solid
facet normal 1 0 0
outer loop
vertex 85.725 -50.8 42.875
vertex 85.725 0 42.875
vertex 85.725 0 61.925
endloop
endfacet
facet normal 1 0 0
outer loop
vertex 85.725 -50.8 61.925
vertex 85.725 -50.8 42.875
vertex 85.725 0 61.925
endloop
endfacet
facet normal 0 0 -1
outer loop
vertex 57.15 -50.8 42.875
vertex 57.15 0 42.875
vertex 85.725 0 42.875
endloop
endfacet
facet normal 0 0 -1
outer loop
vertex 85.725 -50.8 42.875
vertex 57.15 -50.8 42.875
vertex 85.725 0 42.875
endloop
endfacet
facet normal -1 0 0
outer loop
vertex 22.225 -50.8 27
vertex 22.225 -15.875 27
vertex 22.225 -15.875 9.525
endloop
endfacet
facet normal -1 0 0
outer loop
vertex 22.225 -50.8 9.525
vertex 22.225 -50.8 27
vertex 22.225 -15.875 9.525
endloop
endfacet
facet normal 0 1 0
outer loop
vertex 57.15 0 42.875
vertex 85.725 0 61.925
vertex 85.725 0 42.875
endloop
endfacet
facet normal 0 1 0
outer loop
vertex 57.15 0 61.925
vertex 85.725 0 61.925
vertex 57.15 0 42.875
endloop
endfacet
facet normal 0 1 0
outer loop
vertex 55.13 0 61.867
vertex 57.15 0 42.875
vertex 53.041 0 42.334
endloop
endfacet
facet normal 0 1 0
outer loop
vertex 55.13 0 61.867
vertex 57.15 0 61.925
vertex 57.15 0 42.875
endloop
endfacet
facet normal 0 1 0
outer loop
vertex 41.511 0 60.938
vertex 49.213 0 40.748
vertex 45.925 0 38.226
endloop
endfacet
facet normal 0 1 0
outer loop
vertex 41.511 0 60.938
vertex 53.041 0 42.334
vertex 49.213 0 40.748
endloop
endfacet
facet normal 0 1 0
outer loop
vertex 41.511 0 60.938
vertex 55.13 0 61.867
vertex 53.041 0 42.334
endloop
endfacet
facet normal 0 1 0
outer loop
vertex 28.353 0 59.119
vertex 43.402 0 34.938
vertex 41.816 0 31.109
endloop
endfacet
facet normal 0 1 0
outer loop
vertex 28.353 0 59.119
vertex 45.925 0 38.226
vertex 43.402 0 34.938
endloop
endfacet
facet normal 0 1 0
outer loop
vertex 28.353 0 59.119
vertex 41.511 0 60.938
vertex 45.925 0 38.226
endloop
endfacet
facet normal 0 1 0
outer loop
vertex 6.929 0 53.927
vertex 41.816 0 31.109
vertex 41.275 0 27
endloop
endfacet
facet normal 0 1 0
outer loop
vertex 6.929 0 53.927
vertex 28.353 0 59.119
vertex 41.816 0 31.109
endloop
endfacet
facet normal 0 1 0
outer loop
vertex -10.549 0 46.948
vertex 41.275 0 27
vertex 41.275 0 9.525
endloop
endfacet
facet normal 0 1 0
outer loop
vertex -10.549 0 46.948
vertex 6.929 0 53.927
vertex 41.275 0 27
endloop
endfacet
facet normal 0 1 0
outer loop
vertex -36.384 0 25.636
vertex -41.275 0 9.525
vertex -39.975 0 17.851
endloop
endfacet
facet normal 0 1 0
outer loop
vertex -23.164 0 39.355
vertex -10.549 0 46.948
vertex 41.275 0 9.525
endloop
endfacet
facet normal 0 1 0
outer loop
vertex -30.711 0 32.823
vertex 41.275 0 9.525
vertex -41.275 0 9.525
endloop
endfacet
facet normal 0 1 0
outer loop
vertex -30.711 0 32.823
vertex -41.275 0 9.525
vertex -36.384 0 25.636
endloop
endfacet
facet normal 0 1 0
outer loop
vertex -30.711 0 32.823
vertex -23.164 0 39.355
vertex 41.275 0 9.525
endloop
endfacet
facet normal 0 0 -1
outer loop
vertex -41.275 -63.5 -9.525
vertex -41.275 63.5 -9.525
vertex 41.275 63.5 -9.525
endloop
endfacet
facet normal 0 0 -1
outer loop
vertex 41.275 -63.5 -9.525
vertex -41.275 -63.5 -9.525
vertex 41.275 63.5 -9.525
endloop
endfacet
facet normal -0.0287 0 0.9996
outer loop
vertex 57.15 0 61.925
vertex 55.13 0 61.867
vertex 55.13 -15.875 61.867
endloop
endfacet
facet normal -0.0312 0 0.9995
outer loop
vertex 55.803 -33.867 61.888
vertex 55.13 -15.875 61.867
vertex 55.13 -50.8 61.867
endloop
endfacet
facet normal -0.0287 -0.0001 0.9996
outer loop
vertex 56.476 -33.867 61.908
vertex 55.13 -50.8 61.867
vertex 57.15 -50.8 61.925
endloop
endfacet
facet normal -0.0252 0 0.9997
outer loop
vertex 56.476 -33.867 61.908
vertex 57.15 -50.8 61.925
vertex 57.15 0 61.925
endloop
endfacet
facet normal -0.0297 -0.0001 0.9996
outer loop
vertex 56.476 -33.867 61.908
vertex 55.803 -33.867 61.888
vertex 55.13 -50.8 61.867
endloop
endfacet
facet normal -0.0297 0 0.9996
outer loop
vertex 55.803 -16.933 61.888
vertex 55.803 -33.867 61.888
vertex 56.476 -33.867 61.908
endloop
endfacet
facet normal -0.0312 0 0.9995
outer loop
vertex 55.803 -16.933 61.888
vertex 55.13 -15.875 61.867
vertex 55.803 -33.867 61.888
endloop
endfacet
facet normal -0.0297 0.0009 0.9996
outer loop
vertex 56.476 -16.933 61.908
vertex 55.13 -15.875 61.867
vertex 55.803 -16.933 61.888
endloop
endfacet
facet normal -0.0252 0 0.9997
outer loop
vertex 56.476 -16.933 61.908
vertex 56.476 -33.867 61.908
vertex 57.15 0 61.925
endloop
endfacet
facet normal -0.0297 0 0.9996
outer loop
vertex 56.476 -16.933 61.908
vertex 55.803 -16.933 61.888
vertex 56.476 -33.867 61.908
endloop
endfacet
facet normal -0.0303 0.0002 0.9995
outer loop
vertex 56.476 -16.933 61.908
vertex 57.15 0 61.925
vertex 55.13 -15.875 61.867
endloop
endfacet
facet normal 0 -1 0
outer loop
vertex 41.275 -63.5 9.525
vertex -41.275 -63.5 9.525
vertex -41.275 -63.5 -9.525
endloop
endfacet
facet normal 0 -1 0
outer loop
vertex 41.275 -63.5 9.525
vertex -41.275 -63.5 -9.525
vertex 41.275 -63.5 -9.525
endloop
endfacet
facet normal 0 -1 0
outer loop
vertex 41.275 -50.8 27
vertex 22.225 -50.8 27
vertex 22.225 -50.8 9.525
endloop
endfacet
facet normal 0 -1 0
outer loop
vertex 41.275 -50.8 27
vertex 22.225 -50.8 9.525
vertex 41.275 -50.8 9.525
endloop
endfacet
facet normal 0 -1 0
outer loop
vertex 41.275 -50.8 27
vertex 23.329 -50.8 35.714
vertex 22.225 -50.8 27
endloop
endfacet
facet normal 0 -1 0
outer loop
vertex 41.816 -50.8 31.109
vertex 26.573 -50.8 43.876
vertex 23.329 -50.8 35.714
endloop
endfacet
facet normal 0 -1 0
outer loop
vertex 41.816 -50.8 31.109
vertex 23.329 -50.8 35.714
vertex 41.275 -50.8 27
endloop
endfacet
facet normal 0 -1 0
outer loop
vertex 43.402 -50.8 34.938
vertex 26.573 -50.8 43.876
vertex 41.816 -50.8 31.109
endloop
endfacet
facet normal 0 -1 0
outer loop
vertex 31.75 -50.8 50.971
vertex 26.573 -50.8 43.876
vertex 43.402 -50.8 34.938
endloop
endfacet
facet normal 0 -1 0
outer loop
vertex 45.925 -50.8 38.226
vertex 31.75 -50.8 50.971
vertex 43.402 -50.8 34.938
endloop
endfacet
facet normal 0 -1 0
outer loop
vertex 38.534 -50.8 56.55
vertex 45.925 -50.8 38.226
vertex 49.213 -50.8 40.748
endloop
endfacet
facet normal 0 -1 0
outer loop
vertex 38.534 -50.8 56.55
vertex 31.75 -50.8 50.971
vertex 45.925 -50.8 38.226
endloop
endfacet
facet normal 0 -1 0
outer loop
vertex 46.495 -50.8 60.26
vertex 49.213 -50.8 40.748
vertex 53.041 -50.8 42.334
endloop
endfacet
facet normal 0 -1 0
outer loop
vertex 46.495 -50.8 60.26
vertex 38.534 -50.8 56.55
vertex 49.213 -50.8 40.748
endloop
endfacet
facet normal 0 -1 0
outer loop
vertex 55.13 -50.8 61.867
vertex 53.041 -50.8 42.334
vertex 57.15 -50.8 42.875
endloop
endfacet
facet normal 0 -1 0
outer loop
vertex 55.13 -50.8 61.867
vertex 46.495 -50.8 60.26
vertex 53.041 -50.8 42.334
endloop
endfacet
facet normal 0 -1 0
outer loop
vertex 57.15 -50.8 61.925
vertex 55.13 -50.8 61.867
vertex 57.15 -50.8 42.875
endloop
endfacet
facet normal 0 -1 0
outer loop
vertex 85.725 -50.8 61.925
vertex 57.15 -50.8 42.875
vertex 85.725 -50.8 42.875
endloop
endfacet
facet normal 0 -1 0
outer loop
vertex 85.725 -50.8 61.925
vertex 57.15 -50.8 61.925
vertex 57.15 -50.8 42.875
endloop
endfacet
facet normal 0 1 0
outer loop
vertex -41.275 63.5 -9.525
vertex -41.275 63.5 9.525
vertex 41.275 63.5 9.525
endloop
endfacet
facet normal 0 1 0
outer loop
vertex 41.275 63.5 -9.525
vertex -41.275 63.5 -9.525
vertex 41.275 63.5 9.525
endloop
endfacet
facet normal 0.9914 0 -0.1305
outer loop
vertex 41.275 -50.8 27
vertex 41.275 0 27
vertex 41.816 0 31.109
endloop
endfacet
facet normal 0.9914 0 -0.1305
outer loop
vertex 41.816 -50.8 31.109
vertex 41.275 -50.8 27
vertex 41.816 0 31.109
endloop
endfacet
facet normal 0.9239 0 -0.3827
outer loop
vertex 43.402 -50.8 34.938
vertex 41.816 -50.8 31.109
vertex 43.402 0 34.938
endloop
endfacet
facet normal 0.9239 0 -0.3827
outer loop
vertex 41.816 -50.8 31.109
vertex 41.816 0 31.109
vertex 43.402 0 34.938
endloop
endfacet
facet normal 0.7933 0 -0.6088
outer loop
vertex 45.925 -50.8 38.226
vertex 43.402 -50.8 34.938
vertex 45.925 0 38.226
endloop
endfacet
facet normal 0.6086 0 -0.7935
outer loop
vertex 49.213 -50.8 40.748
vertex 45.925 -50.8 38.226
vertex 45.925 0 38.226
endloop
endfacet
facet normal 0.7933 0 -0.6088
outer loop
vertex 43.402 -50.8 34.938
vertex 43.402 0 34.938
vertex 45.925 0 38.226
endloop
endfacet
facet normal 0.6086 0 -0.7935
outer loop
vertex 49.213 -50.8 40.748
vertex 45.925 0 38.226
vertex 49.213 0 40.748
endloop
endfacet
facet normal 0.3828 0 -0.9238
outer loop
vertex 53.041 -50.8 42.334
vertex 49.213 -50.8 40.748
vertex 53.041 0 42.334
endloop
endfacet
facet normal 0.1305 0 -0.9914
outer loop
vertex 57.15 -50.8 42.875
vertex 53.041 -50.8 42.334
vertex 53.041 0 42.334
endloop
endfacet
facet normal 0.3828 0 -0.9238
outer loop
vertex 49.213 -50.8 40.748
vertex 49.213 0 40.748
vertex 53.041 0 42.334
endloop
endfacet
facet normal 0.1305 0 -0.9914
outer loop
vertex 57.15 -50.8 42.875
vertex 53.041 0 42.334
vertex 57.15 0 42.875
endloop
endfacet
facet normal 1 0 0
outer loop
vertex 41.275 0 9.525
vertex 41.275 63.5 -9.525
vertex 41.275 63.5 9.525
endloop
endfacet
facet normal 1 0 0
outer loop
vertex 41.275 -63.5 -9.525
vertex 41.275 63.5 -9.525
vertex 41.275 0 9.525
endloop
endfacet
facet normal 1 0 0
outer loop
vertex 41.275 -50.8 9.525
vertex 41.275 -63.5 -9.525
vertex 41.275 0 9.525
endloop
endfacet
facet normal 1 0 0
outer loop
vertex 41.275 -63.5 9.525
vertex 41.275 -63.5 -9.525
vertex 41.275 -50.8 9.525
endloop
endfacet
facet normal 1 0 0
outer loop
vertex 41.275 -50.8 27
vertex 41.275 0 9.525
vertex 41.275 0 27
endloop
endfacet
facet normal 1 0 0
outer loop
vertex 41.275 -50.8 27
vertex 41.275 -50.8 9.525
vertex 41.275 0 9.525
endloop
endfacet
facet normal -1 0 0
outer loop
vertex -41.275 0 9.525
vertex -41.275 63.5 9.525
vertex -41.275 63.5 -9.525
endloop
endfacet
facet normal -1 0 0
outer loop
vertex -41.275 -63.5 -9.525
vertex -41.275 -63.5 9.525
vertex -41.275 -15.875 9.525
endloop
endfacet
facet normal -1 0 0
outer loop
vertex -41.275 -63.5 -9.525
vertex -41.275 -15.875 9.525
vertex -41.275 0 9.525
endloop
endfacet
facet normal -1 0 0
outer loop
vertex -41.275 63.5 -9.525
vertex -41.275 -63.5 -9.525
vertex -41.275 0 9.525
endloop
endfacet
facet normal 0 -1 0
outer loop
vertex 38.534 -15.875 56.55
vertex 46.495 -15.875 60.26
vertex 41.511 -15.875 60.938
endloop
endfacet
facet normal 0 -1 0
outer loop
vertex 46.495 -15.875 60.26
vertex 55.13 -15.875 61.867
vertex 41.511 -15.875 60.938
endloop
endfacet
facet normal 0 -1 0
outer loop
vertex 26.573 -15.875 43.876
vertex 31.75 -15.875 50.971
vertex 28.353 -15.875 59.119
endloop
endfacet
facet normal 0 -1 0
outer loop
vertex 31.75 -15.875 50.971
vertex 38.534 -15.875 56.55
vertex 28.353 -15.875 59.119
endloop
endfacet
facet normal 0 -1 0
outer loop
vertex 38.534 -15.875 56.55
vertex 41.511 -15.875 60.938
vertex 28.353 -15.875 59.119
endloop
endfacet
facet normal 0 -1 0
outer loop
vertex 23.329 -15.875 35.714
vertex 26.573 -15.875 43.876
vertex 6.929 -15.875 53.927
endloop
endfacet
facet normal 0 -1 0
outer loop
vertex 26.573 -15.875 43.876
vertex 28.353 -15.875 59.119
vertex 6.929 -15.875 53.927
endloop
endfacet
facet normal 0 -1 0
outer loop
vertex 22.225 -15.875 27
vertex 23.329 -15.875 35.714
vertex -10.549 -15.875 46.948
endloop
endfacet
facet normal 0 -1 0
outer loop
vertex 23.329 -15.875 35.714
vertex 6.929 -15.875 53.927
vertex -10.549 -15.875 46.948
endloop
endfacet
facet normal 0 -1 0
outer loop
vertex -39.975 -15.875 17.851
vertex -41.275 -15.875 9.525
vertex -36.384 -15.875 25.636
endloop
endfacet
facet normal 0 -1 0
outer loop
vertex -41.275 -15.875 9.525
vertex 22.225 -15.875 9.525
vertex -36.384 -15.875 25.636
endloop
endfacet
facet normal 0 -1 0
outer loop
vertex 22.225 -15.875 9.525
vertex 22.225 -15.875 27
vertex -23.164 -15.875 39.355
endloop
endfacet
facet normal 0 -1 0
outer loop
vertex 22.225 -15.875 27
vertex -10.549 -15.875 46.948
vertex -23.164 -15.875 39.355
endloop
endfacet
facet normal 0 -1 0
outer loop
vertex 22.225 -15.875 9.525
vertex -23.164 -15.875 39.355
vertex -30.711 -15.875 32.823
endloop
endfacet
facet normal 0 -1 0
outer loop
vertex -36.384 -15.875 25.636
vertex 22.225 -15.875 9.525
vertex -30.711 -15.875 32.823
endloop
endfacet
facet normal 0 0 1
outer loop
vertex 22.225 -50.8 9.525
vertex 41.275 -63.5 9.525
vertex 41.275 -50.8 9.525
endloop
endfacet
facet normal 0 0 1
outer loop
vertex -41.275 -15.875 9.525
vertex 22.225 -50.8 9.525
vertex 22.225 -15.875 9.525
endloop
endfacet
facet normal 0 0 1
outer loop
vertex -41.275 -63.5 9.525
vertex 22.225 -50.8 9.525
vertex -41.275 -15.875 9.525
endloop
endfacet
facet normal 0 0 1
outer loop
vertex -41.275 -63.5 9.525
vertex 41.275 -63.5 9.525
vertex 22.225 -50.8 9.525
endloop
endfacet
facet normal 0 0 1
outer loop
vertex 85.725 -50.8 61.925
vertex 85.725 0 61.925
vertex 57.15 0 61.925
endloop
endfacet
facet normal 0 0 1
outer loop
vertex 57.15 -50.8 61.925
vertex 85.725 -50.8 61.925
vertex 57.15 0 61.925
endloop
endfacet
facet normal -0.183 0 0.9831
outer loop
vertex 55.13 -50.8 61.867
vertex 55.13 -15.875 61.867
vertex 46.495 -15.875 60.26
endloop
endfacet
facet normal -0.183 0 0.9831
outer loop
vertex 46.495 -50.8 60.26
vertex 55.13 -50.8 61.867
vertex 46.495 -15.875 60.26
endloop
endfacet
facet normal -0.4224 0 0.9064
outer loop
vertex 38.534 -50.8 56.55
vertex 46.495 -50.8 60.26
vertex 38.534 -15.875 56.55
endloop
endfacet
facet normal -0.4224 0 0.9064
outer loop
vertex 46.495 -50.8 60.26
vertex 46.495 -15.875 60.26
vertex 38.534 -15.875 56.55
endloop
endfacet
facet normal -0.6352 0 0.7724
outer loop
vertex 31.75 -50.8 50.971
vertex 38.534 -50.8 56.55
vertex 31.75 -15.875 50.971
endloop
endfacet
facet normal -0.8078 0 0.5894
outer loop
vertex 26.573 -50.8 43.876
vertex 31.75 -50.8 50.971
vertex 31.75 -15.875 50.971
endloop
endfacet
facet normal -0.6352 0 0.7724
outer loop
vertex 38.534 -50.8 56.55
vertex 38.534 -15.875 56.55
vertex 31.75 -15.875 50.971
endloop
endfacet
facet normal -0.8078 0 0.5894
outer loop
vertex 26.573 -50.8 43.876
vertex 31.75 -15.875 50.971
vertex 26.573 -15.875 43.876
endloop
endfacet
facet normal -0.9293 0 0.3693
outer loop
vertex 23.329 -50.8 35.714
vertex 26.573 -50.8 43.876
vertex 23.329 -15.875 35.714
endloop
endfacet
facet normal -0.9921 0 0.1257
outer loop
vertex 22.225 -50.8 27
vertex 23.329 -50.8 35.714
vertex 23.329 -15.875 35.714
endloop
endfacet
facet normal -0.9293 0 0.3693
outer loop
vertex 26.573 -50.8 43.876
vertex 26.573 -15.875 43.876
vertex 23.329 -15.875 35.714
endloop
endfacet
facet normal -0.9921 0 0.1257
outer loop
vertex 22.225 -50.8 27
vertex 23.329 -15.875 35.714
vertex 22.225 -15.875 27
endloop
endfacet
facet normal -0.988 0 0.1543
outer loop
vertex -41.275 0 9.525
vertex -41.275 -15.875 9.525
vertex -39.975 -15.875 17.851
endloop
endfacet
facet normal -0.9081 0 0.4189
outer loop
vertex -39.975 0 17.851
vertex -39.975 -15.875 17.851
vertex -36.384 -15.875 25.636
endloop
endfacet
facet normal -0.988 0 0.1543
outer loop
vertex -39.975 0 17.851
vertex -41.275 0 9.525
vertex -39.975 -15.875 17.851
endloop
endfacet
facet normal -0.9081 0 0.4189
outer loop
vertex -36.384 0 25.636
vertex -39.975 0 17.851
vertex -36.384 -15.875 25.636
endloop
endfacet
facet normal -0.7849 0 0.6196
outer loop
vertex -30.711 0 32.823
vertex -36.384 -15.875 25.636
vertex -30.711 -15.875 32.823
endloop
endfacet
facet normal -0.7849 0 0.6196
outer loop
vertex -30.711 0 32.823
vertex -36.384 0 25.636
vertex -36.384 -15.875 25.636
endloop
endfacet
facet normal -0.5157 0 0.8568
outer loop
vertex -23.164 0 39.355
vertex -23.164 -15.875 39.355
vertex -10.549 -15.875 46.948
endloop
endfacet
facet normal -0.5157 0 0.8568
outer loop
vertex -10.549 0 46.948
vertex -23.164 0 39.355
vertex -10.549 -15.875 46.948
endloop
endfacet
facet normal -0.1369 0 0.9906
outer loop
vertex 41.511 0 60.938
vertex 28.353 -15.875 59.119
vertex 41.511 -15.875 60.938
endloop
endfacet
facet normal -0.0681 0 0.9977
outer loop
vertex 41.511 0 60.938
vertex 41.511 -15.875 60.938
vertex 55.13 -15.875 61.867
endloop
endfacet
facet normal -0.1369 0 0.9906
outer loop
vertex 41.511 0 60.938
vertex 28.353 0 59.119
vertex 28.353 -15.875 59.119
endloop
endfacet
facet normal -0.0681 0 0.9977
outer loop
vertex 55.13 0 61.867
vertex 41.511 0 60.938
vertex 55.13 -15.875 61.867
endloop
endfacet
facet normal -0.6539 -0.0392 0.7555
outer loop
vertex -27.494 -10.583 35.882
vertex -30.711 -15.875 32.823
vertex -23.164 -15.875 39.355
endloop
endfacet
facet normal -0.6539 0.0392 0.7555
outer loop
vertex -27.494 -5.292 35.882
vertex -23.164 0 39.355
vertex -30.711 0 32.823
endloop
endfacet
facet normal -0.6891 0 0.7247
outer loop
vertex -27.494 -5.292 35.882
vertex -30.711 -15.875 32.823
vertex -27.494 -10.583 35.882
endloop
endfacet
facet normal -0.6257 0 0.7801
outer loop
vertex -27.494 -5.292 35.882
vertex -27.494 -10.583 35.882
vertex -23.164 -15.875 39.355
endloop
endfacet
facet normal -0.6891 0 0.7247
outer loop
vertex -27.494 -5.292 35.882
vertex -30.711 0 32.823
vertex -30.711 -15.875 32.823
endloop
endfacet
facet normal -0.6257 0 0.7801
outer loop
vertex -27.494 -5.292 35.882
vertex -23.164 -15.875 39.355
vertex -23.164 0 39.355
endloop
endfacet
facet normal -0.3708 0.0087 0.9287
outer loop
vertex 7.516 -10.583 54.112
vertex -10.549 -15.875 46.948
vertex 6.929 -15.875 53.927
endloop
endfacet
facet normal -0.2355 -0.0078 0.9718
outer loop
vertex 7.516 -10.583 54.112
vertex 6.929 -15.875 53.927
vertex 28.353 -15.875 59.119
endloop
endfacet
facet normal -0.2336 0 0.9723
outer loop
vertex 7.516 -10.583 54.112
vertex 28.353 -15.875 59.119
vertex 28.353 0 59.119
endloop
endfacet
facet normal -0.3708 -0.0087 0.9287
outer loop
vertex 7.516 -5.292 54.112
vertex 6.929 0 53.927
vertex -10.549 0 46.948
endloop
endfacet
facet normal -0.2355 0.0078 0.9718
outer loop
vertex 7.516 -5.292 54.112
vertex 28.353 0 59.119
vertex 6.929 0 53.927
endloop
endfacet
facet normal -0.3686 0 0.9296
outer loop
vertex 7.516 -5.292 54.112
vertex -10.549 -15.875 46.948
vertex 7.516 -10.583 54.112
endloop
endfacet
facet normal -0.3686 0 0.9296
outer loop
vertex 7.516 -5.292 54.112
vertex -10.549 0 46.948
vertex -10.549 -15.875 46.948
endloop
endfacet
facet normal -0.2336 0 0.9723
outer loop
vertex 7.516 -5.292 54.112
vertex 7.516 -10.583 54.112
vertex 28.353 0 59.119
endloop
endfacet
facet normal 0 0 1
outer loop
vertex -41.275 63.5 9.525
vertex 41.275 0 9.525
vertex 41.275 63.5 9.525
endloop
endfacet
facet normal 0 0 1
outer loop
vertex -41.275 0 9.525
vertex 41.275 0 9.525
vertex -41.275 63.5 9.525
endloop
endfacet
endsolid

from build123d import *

# Parameters (mm, degrees)
F1_DEPTH = 63.5
F0_W     = 25.4
F0_H     = 19.05
F2_DEPTH = 50.8
F3_DEPTH = 15.875


with BuildPart() as f1:
    # F0 (on Front) → F1 (new body, symmetric)
    with BuildSketch(Plane.XZ):
        Polygon((22.225, 9.525), (-41.275, 9.525), (-41.275, -9.525), (41.275, -9.525), (41.275, 9.525), align=None)
    extrude(amount=F1_DEPTH, both=True)

    # F0 (on Front) → F2 (join)
    with BuildSketch(Plane.XZ):
        with BuildLine():
            Line((22.225, 27.0002), (22.225, 9.525))
            Line((22.225, 9.525), (41.275, 9.525))
            Line((41.275, 9.525), (41.275, 27.0002))
            ThreePointArc((41.275, 27.0002), (45.9246798487, 38.2255201513), (57.15, 42.8752))
            Line((57.15, 42.8752), (60.325, 42.8752))
            Line((60.325, 42.8752), (60.325, 61.9252))
            Line((60.325, 61.9252), (57.15, 61.9252))
            add(Edge.make_bspline(
                [(55.1300589584, 61.8667378721), (55.8023663575, 61.8895709861), (56.4757096001, 61.9090664162), (57.15, 61.9252)],
                knots=[110.0549330029, 110.0549330029, 110.0549330029, 110.0549330029, 111.5045361635, 111.5045361635, 111.5045361635, 111.5045361635], degree=3))
            ThreePointArc((55.1300589584, 61.8667378721), (31.7501765176, 50.9711113732), (22.225, 27.0002))
        make_face()
        with Locations((73.025, 52.4002)):
            Rectangle(F0_W, F0_H)
    extrude(amount=F2_DEPTH)

    # F0 (on Front) → F3 (join)
    with BuildSketch(Plane.XZ):
        with BuildLine():
            add(Edge.make_bspline(
                [(-41.275, 9.525), (-40.983522632, 39.1614563613), (4.0879891143, 60.1332311464), (55.1300589584, 61.8667378721)],
                knots=[0, 0, 0, 0, 110.0549330029, 110.0549330029, 110.0549330029, 110.0549330029], degree=3))
            Line((-41.275, 9.525), (22.225, 9.525))
            Line((22.225, 9.525), (22.225, 27.0002))
            ThreePointArc((22.225, 27.0002), (31.7501765176, 50.9711113732), (55.1300589584, 61.8667378721))
        make_face()
    extrude(amount=F3_DEPTH)


solid = f1.part
